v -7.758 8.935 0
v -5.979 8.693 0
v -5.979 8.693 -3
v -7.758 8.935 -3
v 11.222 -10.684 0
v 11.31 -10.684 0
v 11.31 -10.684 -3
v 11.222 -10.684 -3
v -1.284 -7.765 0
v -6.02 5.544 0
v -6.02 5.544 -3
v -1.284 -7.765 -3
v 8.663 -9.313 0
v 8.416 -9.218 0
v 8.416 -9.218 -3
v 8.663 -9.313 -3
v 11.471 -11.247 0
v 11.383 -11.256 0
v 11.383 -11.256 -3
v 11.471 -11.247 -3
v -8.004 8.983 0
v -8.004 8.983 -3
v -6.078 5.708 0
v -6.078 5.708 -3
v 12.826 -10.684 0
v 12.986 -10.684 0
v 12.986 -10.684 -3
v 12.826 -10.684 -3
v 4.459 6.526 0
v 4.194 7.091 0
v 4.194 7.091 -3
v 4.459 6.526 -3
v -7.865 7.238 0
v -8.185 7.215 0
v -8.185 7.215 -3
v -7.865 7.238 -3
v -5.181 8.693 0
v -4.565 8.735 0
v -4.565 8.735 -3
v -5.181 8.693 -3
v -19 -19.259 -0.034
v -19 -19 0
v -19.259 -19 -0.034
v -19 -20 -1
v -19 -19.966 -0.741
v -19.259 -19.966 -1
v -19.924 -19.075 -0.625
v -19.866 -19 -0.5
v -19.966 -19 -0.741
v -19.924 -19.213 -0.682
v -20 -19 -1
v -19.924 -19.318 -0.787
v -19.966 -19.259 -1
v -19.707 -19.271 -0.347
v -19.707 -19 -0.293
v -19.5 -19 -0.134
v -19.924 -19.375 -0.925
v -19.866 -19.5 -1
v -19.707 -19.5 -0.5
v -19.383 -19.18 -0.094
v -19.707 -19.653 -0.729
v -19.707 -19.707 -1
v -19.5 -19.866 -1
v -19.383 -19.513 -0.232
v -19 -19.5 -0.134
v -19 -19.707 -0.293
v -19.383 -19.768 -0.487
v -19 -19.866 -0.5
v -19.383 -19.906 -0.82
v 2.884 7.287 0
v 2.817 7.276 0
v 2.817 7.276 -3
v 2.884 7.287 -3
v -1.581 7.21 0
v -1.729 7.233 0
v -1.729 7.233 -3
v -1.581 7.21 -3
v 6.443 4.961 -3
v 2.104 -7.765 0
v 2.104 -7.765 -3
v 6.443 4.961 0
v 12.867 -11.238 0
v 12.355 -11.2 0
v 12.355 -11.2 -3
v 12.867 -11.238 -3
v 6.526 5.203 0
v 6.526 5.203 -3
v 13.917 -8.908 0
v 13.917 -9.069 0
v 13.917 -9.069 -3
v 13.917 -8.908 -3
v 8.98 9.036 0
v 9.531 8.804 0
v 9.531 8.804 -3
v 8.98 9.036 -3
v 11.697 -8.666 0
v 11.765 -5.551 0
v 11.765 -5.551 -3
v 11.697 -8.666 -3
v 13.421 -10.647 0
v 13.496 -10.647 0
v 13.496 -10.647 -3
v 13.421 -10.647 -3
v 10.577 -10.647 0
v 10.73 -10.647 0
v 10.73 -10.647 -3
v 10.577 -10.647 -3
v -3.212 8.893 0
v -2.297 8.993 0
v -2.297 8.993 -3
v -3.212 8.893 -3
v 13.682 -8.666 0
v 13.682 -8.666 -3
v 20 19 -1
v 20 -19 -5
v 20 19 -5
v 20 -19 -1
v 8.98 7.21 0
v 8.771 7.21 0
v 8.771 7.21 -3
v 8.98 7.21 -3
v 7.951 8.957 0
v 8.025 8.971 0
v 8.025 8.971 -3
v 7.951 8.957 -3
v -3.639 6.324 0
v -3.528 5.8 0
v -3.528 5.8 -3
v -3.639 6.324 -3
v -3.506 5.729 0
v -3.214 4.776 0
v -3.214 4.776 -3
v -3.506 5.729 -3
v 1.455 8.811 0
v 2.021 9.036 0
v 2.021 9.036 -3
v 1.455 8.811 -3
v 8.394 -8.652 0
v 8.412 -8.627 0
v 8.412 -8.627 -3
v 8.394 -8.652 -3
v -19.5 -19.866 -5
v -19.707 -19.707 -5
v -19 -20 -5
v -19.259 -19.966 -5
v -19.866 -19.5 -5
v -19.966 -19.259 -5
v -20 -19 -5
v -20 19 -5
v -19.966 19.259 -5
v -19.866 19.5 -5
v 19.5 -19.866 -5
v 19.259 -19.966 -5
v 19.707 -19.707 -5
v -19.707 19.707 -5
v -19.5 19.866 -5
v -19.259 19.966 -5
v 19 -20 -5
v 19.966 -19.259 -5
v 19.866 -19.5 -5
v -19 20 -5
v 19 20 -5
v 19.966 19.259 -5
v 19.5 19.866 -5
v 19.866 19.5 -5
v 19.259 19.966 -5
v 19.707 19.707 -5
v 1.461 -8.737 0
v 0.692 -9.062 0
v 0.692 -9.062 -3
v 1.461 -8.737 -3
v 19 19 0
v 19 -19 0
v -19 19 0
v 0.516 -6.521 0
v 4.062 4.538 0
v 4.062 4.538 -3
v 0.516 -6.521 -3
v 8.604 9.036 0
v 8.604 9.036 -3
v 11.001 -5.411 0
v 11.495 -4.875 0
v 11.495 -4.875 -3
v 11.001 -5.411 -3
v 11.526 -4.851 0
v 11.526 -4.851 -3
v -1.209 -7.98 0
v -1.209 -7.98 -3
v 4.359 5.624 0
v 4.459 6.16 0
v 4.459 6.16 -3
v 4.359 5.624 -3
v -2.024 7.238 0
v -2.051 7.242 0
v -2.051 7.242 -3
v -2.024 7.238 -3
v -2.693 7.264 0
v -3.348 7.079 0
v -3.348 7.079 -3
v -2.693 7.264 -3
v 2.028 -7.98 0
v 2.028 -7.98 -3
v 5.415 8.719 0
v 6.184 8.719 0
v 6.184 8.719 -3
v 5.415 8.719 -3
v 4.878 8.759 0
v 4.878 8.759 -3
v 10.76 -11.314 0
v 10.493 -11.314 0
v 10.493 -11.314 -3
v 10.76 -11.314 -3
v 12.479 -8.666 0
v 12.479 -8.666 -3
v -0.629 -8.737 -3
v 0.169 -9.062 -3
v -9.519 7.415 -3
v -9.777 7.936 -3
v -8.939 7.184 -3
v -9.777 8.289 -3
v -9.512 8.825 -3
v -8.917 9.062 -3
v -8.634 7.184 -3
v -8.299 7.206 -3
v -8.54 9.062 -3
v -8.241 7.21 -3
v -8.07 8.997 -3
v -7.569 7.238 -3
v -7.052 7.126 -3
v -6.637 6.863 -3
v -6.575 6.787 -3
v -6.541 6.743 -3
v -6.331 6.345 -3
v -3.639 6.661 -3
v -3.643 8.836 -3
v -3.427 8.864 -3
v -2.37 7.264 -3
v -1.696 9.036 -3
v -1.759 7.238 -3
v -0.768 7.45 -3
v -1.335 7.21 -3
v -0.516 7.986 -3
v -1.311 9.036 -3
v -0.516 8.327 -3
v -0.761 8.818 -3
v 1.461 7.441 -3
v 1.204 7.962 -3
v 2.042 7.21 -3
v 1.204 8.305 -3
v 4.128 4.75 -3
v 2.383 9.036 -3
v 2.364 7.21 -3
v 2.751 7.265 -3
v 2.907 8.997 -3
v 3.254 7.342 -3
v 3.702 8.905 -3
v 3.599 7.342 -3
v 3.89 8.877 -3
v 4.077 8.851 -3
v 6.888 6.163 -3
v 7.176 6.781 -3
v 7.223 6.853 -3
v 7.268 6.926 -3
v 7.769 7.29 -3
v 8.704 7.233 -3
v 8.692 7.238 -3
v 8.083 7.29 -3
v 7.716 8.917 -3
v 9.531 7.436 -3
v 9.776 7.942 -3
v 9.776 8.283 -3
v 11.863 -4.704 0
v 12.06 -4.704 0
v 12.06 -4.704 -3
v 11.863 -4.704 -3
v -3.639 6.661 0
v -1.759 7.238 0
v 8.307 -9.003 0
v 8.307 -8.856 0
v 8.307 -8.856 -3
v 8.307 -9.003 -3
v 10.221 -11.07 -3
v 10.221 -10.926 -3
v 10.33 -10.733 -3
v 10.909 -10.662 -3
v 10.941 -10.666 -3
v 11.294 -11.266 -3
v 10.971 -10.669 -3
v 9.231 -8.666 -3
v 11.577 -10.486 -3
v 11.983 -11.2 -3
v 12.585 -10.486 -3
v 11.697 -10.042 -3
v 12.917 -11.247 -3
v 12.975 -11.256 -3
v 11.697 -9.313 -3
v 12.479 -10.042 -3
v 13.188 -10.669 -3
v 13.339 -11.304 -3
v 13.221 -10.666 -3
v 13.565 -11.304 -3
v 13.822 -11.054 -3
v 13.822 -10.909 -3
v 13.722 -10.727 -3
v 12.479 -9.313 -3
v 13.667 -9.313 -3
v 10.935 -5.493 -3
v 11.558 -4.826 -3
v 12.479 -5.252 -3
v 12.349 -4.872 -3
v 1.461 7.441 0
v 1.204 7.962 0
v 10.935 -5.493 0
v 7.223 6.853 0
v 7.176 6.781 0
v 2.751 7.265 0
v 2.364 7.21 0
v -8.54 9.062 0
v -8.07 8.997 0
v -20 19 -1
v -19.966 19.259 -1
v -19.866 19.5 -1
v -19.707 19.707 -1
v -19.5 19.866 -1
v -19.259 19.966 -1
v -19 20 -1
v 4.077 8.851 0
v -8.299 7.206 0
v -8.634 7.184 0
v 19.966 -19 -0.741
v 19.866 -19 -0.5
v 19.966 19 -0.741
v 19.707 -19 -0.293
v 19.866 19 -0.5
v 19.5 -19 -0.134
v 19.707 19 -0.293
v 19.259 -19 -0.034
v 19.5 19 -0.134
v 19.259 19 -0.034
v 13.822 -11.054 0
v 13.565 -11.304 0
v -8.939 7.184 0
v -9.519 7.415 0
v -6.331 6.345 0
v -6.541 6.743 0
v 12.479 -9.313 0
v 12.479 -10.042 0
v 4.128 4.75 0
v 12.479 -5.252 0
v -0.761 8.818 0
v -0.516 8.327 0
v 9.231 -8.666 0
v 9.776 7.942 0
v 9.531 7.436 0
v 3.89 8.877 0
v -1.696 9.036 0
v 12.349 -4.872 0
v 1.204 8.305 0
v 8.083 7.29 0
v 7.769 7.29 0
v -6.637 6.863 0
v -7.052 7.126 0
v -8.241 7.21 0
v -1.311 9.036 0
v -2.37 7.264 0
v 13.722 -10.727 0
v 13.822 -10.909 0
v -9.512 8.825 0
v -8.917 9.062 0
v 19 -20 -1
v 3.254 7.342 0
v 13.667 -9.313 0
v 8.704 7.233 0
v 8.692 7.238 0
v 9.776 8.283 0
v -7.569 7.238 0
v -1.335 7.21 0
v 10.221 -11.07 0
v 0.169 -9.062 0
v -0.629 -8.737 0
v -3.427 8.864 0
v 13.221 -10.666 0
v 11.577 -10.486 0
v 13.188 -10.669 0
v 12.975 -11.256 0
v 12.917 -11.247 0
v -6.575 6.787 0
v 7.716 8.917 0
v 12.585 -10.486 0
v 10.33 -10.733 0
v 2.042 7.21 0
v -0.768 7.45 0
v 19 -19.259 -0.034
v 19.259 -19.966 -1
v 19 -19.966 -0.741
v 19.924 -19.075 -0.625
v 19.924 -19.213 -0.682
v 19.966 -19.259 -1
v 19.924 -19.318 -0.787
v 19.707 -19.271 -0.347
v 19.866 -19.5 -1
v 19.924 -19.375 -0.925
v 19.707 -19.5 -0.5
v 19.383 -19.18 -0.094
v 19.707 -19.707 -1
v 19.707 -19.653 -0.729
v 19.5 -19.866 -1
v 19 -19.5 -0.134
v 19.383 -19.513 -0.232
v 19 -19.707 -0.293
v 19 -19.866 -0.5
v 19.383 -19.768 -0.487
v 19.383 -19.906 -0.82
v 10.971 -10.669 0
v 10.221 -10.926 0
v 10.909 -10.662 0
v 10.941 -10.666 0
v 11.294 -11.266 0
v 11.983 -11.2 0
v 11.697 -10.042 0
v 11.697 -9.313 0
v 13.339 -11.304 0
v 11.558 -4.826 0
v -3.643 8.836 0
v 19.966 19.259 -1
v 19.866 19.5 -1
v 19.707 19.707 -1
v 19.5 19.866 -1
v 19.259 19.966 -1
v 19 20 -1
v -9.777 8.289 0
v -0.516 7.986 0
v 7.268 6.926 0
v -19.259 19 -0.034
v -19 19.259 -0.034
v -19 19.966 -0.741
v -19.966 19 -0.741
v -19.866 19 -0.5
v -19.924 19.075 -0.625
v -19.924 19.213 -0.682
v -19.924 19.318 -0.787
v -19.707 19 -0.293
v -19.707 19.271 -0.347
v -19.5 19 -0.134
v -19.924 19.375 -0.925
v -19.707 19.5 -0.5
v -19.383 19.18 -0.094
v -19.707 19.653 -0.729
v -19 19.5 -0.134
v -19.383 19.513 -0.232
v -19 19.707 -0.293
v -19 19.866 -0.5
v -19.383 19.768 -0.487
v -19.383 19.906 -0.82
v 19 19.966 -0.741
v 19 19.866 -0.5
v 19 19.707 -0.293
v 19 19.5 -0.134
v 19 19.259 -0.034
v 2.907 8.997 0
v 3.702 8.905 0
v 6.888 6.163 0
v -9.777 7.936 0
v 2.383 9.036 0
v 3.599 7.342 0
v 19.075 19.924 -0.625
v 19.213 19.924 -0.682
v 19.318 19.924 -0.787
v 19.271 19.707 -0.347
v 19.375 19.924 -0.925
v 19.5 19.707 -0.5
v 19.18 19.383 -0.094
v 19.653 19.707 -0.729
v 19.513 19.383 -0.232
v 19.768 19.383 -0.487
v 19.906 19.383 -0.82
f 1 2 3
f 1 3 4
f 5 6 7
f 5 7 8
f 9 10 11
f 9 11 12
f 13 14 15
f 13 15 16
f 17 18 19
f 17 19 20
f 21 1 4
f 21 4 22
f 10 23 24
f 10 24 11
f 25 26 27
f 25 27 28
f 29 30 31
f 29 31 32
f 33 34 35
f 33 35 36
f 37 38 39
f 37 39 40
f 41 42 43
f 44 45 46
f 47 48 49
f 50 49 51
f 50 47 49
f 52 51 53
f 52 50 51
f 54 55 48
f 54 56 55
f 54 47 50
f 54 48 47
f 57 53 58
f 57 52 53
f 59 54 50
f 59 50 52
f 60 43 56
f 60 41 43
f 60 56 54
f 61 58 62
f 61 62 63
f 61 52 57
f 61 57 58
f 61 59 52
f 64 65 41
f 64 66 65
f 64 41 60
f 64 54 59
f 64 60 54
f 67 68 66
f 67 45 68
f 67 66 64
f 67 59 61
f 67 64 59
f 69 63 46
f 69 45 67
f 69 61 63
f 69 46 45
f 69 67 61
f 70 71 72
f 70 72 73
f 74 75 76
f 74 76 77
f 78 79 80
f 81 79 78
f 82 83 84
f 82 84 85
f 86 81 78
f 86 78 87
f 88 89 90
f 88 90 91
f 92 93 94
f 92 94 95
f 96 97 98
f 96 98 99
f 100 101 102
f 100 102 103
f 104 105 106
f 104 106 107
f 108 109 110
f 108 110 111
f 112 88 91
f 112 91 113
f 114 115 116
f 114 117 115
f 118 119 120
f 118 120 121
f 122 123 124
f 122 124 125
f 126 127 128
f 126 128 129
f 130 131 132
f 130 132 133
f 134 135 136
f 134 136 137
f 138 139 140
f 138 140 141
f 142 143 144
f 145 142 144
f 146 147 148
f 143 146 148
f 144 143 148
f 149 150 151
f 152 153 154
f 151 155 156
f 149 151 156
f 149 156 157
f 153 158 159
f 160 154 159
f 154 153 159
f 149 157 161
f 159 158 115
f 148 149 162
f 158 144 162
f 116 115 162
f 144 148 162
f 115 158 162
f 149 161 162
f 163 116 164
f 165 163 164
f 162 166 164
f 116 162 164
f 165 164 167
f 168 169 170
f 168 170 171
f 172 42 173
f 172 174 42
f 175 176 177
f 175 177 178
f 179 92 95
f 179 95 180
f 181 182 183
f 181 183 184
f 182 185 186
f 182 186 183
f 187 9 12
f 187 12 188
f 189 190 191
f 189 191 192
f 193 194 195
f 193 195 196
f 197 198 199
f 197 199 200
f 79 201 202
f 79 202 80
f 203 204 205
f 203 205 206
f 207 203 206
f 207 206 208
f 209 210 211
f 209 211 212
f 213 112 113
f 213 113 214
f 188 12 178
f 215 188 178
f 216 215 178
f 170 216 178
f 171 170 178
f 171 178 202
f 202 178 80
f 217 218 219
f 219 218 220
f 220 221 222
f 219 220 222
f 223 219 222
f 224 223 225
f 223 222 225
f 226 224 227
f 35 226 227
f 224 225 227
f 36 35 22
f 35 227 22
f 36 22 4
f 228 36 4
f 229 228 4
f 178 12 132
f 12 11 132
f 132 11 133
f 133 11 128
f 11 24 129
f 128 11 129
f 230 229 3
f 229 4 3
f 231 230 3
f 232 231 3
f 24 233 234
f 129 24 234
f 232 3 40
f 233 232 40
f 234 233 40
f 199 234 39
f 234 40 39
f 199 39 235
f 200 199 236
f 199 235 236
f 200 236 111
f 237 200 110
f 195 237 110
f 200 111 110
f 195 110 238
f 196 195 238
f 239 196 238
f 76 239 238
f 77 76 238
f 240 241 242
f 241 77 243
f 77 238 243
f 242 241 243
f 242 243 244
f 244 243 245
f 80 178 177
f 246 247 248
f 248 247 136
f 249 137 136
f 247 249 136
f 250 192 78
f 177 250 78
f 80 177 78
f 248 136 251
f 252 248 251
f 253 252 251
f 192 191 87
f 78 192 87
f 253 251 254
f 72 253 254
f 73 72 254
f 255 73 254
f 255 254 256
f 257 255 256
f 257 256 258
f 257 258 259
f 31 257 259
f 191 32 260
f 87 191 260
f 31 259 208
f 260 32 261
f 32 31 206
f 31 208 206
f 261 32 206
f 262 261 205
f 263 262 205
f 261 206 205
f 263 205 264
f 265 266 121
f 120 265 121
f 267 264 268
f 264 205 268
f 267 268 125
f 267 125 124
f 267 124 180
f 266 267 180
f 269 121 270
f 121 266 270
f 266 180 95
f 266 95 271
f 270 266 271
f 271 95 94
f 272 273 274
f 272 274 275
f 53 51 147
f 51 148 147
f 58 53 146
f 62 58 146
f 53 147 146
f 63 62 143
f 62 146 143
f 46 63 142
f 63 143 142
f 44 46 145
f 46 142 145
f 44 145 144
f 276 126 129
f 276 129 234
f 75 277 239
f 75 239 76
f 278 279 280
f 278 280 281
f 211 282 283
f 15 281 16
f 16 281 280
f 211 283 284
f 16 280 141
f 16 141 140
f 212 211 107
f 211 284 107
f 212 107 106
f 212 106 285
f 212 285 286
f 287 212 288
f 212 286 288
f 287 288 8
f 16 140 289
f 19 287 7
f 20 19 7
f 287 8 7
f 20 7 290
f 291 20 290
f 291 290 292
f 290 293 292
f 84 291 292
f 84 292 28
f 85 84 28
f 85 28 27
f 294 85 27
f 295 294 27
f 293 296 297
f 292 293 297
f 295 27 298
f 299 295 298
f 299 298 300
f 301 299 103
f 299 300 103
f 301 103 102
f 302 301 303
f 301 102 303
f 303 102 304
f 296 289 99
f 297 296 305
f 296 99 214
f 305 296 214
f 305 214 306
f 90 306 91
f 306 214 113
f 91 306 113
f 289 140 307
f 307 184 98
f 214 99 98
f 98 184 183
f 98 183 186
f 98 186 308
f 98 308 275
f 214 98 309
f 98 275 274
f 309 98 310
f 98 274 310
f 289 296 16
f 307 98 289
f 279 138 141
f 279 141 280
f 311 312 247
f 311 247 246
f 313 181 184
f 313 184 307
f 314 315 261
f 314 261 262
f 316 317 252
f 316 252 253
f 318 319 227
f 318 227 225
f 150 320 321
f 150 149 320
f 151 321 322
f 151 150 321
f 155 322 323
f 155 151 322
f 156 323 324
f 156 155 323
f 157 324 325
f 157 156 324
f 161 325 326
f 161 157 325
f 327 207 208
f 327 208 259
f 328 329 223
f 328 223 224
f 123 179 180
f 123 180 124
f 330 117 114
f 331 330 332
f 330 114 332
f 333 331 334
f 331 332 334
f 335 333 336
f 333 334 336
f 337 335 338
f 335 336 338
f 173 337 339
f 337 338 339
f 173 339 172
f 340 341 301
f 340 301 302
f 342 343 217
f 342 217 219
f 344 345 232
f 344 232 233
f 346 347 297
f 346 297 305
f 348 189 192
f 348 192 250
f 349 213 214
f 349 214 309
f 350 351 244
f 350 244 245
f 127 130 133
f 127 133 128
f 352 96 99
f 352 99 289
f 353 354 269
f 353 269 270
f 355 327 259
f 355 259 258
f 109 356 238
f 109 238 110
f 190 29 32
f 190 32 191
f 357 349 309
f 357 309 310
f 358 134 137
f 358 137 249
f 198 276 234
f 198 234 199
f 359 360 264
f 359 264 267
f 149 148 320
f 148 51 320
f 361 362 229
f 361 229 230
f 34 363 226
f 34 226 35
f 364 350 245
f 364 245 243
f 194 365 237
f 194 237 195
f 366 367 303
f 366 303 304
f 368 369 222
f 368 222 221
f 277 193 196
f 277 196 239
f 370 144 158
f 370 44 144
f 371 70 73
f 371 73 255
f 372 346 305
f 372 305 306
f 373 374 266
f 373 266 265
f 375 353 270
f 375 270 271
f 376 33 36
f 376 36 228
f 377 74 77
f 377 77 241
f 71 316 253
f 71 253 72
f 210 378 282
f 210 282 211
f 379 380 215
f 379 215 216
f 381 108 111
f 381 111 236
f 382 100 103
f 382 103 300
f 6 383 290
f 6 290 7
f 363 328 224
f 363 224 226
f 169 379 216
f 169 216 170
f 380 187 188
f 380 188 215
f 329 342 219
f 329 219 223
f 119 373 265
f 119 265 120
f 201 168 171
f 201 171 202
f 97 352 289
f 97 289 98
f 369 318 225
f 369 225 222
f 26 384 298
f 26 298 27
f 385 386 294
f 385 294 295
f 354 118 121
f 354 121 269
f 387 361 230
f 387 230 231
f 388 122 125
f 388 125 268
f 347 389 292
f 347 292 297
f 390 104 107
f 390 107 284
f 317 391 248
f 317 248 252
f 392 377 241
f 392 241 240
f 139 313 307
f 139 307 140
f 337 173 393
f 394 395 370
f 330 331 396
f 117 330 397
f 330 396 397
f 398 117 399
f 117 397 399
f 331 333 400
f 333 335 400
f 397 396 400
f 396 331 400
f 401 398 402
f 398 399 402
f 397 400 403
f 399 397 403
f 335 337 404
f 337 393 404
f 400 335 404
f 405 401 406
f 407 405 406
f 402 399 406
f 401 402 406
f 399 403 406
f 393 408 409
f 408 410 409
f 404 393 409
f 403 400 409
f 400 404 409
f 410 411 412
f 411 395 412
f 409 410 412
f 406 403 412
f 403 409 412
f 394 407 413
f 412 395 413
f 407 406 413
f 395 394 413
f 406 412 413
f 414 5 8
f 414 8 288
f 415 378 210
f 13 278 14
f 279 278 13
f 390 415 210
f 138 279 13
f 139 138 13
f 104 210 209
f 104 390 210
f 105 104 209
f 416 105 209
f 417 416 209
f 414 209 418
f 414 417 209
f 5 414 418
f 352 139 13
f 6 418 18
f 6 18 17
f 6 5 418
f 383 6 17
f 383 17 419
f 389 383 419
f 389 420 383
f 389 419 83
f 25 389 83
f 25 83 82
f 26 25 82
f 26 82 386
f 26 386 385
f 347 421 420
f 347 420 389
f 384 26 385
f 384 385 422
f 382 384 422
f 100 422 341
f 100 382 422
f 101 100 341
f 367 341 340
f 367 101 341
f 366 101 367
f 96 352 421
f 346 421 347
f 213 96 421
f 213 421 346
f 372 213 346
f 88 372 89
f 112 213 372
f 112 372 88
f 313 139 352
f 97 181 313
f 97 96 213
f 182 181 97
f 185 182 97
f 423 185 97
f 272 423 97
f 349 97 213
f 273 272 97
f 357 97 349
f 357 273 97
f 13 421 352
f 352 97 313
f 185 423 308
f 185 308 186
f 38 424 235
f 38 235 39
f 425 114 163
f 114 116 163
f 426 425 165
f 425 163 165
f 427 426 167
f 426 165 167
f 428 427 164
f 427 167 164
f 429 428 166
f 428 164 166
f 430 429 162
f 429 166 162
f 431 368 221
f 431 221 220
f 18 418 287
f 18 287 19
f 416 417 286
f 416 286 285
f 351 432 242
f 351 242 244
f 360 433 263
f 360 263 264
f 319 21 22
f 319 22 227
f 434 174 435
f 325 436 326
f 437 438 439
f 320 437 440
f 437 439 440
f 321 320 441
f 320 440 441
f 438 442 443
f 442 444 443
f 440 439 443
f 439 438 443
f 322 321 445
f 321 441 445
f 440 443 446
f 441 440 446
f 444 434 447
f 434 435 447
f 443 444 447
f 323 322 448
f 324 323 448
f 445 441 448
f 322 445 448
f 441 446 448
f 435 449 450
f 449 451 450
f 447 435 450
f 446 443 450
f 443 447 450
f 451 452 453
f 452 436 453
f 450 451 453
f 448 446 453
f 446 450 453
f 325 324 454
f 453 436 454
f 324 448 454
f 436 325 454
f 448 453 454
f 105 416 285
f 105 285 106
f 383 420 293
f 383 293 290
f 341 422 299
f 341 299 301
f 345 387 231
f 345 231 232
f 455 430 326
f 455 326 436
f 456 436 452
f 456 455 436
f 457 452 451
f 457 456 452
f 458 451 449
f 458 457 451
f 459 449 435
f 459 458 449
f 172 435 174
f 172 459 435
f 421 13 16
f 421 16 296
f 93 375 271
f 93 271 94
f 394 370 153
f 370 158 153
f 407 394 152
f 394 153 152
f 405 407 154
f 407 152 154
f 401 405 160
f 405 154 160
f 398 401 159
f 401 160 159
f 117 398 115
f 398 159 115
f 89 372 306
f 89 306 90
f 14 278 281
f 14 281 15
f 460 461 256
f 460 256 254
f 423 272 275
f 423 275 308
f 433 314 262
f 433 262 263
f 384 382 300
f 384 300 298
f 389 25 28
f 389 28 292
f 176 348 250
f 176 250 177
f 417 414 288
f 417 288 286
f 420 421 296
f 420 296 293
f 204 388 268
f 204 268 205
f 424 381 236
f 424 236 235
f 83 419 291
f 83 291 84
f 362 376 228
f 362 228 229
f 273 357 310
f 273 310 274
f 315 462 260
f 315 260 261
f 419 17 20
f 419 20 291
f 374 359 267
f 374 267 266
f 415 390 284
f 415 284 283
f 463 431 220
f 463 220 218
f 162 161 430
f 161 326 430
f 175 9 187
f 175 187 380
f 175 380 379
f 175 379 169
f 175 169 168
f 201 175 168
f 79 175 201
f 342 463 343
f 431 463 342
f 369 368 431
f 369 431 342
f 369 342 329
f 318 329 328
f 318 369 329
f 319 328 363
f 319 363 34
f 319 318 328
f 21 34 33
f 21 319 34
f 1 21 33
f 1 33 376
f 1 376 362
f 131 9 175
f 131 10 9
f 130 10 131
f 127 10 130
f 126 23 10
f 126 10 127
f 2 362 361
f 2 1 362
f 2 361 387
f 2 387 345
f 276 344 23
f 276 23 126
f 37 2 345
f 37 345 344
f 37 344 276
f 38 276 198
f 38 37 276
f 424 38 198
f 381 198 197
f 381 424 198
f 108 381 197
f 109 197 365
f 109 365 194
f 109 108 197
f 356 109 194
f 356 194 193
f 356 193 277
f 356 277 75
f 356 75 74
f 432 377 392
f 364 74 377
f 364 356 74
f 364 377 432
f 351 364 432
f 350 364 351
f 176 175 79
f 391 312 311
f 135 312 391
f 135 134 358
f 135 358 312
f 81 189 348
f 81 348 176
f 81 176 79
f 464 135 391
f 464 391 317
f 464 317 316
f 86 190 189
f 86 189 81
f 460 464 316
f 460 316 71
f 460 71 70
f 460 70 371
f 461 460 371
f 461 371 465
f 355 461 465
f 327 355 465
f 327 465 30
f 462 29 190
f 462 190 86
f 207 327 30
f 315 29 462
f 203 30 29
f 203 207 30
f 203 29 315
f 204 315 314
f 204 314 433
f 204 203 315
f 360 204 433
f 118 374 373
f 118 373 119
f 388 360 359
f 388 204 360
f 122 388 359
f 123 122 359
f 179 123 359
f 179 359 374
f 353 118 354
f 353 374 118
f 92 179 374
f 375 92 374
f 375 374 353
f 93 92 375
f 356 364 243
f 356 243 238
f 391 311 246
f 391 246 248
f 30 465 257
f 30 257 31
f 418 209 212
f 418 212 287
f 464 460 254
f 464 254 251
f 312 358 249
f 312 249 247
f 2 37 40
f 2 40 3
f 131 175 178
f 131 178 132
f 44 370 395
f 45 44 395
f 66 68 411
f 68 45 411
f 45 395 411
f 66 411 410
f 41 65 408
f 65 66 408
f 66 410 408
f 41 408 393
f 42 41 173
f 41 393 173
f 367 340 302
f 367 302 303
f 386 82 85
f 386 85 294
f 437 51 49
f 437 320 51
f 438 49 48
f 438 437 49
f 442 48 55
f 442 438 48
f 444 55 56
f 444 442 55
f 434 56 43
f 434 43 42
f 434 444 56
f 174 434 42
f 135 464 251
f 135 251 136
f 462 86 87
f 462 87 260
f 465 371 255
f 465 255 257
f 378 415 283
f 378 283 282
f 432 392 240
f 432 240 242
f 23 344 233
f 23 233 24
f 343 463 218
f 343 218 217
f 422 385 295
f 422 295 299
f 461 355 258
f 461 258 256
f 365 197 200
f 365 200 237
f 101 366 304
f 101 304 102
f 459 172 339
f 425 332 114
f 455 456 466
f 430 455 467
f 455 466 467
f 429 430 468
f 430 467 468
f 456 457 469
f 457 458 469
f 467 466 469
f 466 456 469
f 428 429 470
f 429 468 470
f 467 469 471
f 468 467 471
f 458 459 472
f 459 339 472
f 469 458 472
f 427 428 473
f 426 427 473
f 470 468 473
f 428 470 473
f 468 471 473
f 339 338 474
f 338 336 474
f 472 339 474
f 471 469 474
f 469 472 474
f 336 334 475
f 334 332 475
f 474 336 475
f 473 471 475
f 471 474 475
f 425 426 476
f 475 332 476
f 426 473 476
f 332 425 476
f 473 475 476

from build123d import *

# Parameters (mm, degrees)
F0_W     = 40
F0_H     = 40
F1_DEPTH = 5
F2_R     = 1
F5_DEPTH = 3


with BuildPart() as f1:
    # F0 (on Top) → F1 (new body)
    with BuildSketch(Plane.XY):
        Rectangle(F0_W, F0_H)
    extrude(amount=-F1_DEPTH)

    # F2
    f2_edges = [f1.edges().sort_by_distance(p)[0] for p in [
        (0, -20, 0),
        (20, 0, 0),
        (0, 20, 0),
        (-20, 0, 0),
        (-20, 20, -2.5),
        (20, 20, -2.5),
        (-20, -20, -2.5),
        (20, -20, -2.5),
    ]]
    fillet(f2_edges, radius=F2_R)


with BuildPart() as f5:
    # F3 (on Top) + F4 (on Top) → F5 (new body)
    with BuildSketch(Plane.XY):
        Polygon((0.516077, -6.520866), (-3.214268, 4.776292), (-3.506445, 5.728513), (-3.528492, 5.800166), (-3.638728, 6.323838), (-3.638728, 6.522263), (-3.638728, 6.66148), (-3.347949, 7.07898), (-2.693391, 7.263663), (-2.47429, 7.263663), (-2.369541, 7.263663), (-2.051228, 7.241616), (-2.023643, 7.237501), (-1.759052, 7.237501), (-1.728749, 7.233336), (-1.581302, 7.209892), (-1.52207, 7.209892), (-1.334643, 7.209892), (-0.768248, 7.449693), (-0.516077, 7.98576), (-0.516077, 8.163535), (-0.516077, 8.327492), (-0.761365, 8.818067), (-1.311224, 9.035821), (-1.494485, 9.035821), (-1.695679, 9.035821), (-2.296516, 8.993099), (-3.211525, 8.892515), (-3.426511, 8.863559), (-3.642868, 8.836), (-4.564786, 8.735416), (-5.180762, 8.692693), (-5.384698, 8.692693), (-5.978627, 8.692693), (-7.757668, 8.935237), (-8.004353, 8.983447), (-8.070494, 8.997213), (-8.540394, 9.061983), (-8.718169, 9.061983), (-8.916619, 9.061983), (-9.511919, 8.825001), (-9.776511, 8.288909), (-9.776511, 8.109763), (-9.776511, 7.936128), (-9.518802, 7.415251), (-8.938666, 7.18373), (-8.744356, 7.18373), (-8.63412, 7.18373), (-8.299247, 7.205777), (-8.24136, 7.209892), (-8.184871, 7.215454), (-7.865161, 7.237501), (-7.739761, 7.237501), (-7.568895, 7.237501), (-7.052107, 7.125868), (-6.637325, 6.862674), (-6.575323, 6.786855), (-6.540856, 6.74276), (-6.331407, 6.344514), (-6.077839, 5.707837), (-6.019978, 5.54388), (-1.283665, -7.765237), (-1.209218, -7.980197), (-0.629082, -8.736736), (0.168808, -9.061958), (0.436143, -9.061958), (0.692455, -9.061958), (1.461414, -8.736736), (2.027758, -7.980197), (2.103577, -7.765237), (6.443015, 4.96095), (6.525666, 5.203469), (6.888124, 6.162599), (7.176135, 6.781343), (7.222973, 6.852996), (7.268439, 6.926047), (7.768692, 7.289851), (7.950581, 7.289851), (8.082864, 7.289851), (8.691982, 7.237501), (8.704351, 7.233336), (8.770518, 7.209892), (8.79668, 7.209892), (8.979992, 7.209892), (9.531198, 7.435926), (9.776485, 7.941666), (9.776485, 8.109763), (9.776485, 8.283397), (9.531198, 8.804326), (8.979992, 9.035821), (8.79668, 9.035821), (8.603793, 9.035821), (8.024978, 8.971051), (7.950581, 8.957285), (7.716291, 8.917305), (6.183935, 8.71888), (5.595518, 8.71888), (5.415001, 8.71888), (4.877562, 8.758834), (4.076903, 8.851163), (3.889502, 8.877351), (3.702075, 8.904884), (2.906954, 8.997213), (2.383333, 9.035821), (2.209698, 9.035821), (2.020875, 9.035821), (1.454506, 8.811209), (1.203706, 8.305444), (1.203706, 8.13595), (1.203706, 7.962341), (1.461414, 7.441438), (2.04155, 7.209892), (2.23586, 7.209892), (2.364029, 7.209892), (2.751226, 7.265035), (2.817393, 7.276059), (2.883535, 7.287082), (3.254223, 7.3422), (3.400323, 7.3422), (3.598748, 7.3422), (4.194073, 7.091401), (4.45864, 6.526403), (4.45864, 6.33763), (4.45864, 6.159856), (4.359402, 5.623789), (4.127906, 4.75013), (4.061765, 4.537888), align=None)
    with BuildSketch(Plane.XY):
        Polygon((12.47872, -8.665563), (12.47872, -5.37893), (12.47872, -5.252159), (12.34918, -4.871819), (12.059798, -4.703697), (11.9647, -4.703697), (11.862745, -4.703697), (11.558173, -4.826353), (11.526474, -4.851144), (11.4948, -4.874588), (11.001456, -5.410629), (10.935315, -5.493306), (8.412129, -8.626981), (8.394197, -8.651771), (8.30738, -8.855733), (8.30738, -8.932898), (8.30738, -9.00318), (8.416244, -9.218166), (8.662929, -9.313238), (8.745606, -9.313238), (11.697365, -9.313238), (11.697365, -9.894771), (11.697365, -10.042218), (11.577477, -10.485956), (11.310142, -10.684381), (11.221928, -10.684381), (10.971129, -10.669217), (10.940826, -10.666474), (10.909127, -10.662333), (10.729981, -10.64717), (10.659699, -10.64717), (10.577022, -10.64717), (10.330363, -10.732615), (10.221473, -10.925554), (10.221473, -10.990324), (10.221473, -11.070232), (10.492948, -11.314148), (10.583906, -11.314148), (10.760309, -11.314148), (11.293607, -11.265914), (11.383167, -11.256287), (11.471356, -11.246635), (11.982607, -11.199772), (12.183801, -11.199772), (12.354692, -11.199772), (12.867315, -11.238355), (12.916946, -11.246635), (12.974808, -11.256287), (13.338612, -11.304496), (13.479175, -11.304496), (13.564596, -11.304496), (13.822304, -11.053697), (13.822304, -10.97102), (13.822304, -10.909018), (13.721695, -10.727103), (13.495711, -10.64717), (13.421263, -10.64717), (13.221467, -10.666474), (13.188396, -10.669217), (12.985831, -10.684381), (12.907269, -10.684381), (12.825964, -10.684381), (12.584841, -10.485956), (12.47872, -10.042218), (12.47872, -9.894771), (12.47872, -9.313238), (13.5839, -9.313238), (13.666602, -9.313238), (13.917376, -9.069322), (13.917376, -8.989413), (13.917376, -8.908108), (13.68174, -8.665563), (13.603204, -8.665563), align=None)
        Polygon((11.697365, -8.665563), (9.23067, -8.665563), (11.764879, -5.551193), align=None, mode=Mode.SUBTRACT)
    extrude(amount=-F5_DEPTH)


solid = Compound([f1.part, f5.part])
